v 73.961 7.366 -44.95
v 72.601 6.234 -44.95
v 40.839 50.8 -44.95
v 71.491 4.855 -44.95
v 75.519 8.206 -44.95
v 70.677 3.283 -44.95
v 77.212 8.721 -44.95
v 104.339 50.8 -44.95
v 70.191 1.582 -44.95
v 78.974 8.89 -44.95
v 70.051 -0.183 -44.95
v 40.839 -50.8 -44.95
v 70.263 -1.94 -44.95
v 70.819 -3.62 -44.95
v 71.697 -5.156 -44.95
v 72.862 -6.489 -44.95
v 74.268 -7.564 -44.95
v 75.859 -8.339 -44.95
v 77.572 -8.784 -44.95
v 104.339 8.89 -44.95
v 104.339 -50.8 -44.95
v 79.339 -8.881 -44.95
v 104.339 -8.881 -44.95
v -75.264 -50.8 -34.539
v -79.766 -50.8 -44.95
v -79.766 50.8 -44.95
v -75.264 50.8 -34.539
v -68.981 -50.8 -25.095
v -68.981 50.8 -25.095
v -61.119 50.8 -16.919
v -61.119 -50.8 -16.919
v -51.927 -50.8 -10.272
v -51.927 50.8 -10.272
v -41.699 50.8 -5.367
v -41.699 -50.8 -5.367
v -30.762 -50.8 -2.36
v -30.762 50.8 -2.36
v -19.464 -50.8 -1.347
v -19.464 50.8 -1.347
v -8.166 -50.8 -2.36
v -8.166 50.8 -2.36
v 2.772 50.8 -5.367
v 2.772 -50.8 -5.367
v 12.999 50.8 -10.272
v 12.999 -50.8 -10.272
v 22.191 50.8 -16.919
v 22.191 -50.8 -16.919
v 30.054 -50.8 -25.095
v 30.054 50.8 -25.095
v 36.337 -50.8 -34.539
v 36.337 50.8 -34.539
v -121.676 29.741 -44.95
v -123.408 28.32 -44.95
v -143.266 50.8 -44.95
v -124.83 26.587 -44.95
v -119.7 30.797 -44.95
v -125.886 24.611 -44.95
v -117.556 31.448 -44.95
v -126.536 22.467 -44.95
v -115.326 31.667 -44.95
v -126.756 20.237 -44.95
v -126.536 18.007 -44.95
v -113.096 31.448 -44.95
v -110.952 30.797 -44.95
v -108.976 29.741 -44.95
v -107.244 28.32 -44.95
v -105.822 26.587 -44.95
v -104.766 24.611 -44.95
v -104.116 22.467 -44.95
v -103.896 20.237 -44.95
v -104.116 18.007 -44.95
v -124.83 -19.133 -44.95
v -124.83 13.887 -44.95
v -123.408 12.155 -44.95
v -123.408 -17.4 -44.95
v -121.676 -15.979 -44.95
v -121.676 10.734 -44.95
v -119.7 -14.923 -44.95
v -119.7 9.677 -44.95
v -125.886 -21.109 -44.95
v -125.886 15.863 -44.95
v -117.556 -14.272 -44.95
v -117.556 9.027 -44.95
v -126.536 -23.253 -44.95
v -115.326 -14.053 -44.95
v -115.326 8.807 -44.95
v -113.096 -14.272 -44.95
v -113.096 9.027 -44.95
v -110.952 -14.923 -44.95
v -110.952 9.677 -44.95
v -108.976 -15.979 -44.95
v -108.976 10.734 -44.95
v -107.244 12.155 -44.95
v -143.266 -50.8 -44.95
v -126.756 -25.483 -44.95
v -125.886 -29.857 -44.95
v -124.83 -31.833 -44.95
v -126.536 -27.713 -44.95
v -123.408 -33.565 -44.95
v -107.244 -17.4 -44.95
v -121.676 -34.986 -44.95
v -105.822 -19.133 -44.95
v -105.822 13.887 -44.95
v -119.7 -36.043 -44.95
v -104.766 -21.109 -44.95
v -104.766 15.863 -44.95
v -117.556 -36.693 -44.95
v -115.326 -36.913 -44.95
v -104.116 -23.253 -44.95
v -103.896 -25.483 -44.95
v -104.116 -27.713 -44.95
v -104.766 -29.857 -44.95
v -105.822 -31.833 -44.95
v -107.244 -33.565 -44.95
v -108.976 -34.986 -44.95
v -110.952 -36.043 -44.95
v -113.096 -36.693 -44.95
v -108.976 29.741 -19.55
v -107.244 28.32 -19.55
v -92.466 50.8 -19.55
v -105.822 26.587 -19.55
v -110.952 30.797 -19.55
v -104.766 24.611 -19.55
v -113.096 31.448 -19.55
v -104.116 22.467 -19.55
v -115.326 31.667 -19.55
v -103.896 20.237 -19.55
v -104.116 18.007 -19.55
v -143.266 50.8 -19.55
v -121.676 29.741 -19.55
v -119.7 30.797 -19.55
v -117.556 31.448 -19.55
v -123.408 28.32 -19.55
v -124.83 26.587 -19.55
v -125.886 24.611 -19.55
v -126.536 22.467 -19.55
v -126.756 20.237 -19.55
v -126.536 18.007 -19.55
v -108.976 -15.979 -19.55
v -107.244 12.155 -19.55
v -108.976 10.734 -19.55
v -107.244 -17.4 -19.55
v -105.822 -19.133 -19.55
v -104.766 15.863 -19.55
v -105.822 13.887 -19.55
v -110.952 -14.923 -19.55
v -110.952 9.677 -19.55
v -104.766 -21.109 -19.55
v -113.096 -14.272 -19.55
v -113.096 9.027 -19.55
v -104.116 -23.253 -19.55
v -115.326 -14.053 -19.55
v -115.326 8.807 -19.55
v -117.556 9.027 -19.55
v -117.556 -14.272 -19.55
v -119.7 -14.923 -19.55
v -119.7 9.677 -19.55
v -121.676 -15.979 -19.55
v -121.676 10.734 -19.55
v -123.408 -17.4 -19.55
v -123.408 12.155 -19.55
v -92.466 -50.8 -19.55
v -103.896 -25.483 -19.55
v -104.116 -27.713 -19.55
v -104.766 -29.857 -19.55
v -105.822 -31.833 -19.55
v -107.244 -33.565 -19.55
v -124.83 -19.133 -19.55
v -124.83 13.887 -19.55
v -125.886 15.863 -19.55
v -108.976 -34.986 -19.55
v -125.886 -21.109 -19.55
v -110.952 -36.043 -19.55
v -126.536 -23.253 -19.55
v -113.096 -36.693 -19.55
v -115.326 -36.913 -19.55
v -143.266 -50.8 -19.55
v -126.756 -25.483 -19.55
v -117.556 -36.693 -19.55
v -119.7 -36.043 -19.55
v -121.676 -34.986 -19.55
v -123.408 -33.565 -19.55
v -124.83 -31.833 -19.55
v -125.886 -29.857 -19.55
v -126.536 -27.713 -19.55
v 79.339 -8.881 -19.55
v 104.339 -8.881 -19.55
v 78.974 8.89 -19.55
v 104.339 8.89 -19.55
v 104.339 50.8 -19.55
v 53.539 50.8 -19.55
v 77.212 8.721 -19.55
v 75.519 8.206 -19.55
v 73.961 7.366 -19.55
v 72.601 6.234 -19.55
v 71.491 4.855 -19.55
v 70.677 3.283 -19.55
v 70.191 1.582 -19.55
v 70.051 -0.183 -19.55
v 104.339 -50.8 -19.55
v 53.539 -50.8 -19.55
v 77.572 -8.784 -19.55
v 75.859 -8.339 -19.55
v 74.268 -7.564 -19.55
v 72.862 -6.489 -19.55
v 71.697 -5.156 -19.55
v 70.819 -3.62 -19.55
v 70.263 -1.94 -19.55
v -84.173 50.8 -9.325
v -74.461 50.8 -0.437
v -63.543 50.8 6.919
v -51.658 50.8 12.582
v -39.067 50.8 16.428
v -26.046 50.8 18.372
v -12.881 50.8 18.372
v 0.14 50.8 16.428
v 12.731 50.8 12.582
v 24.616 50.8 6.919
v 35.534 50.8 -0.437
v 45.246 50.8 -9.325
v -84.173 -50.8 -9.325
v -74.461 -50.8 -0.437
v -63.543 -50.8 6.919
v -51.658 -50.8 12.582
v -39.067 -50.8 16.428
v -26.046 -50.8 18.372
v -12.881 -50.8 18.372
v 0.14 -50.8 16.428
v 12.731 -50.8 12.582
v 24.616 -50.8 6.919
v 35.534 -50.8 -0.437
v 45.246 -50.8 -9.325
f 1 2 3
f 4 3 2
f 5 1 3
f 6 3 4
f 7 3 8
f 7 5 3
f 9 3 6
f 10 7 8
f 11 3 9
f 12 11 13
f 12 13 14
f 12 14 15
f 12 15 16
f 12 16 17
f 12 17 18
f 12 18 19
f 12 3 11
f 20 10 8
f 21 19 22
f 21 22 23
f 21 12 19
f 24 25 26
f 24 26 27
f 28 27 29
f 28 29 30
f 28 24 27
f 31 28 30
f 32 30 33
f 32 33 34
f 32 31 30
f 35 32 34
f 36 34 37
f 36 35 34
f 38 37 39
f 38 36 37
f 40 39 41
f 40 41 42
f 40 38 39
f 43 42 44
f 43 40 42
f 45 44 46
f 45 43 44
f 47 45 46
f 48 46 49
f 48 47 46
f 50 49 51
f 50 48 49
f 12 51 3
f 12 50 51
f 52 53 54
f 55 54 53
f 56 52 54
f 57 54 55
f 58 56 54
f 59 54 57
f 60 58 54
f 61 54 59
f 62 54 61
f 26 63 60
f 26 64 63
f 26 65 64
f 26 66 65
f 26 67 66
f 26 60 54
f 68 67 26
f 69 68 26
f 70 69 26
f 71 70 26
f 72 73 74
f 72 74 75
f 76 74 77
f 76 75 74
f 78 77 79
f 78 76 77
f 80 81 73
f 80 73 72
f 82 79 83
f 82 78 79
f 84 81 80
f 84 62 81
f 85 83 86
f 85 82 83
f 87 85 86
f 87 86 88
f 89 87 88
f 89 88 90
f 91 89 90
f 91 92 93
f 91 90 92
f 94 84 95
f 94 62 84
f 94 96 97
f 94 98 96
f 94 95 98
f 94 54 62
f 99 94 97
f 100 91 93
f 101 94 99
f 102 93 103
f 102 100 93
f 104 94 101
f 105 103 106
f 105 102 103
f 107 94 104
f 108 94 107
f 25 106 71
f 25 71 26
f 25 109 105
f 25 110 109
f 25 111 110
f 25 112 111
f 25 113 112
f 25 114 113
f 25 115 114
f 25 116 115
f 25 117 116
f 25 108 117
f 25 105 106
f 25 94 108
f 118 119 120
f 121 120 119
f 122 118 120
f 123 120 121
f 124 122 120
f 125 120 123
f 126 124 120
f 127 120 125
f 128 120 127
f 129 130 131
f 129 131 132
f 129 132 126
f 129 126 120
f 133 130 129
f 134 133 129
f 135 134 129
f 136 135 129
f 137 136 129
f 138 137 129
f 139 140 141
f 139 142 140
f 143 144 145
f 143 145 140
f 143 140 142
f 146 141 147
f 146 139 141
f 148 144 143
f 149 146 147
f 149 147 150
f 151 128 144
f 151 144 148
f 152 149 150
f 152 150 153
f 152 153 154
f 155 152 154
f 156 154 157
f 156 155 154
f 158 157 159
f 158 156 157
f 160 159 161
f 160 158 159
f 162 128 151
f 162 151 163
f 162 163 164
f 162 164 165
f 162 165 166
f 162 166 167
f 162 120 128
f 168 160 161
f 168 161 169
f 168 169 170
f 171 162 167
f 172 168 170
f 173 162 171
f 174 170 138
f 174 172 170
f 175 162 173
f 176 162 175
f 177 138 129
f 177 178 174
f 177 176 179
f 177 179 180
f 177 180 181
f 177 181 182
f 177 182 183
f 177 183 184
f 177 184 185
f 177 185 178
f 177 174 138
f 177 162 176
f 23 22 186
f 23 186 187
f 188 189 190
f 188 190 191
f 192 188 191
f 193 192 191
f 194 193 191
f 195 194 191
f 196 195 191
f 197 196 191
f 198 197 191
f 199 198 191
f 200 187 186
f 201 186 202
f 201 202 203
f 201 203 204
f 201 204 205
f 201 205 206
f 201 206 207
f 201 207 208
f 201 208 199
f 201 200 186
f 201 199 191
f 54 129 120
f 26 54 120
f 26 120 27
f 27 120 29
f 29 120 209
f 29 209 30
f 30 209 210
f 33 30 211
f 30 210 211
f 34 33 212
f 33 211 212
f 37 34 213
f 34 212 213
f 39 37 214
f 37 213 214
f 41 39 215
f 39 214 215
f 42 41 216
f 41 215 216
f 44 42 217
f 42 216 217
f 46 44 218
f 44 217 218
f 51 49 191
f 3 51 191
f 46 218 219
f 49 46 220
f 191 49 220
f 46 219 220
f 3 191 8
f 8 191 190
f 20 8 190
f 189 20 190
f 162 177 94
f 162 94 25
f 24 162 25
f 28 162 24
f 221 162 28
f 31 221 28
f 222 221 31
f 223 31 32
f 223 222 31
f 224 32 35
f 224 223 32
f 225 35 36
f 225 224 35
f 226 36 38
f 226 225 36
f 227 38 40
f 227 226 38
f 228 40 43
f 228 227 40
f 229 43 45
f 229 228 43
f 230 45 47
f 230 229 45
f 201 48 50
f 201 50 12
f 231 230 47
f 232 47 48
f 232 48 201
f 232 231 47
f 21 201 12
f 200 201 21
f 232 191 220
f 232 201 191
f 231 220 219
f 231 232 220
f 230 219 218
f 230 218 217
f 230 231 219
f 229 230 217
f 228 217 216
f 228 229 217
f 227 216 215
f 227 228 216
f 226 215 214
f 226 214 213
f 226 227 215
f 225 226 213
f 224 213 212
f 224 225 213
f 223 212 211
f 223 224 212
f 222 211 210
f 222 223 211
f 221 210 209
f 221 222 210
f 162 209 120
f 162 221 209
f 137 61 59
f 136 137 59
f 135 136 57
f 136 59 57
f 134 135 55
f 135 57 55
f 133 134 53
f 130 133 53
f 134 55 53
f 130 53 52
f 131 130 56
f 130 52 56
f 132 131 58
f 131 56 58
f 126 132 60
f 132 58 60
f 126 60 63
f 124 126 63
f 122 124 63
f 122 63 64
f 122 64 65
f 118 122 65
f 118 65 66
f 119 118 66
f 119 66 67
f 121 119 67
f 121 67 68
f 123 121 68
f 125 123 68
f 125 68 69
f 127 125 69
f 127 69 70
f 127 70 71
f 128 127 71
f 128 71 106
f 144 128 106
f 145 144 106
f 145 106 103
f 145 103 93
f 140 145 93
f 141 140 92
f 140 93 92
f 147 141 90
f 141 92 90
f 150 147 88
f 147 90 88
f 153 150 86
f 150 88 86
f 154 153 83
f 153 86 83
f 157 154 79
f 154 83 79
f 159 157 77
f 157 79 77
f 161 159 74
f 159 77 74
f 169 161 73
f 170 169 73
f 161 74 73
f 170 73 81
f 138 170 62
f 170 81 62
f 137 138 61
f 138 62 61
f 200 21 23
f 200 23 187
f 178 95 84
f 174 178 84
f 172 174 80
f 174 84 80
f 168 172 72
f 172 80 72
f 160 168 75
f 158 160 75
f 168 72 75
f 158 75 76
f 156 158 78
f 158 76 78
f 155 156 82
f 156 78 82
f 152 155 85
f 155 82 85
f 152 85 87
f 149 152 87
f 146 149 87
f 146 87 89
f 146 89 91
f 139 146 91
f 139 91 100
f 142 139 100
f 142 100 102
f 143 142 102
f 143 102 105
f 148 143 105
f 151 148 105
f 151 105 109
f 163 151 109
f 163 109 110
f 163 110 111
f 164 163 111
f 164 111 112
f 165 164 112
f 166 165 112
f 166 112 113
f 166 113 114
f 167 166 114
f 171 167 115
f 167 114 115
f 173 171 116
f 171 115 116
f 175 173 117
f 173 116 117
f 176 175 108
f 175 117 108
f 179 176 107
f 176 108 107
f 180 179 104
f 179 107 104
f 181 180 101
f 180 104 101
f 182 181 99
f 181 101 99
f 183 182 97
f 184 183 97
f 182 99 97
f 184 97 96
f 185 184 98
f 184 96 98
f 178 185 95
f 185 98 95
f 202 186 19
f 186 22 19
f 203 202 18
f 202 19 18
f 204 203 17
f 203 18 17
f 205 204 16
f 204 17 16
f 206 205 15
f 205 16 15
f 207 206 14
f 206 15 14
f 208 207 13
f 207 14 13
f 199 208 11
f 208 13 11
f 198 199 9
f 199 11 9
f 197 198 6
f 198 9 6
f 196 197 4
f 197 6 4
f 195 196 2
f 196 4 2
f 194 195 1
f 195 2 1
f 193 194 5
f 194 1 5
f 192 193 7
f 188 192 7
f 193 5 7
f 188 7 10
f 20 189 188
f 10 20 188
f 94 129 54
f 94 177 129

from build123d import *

# Parameters (mm, degrees)
F1_DEPTH = 50.8
F3_D     = 22.86
F5_D     = 17.78
F7_DEPTH = 25.4


with BuildPart() as f1:
    # F0 (on Front) → F1 (new body, symmetric)
    with BuildSketch(Plane.XZ):
        with BuildLine():
            Line((-143.2661156607, -19.5504479766), (-143.2661156607, -44.9504479766))
            Line((-143.2661156607, -44.9504479766), (-79.7661156607, -44.9504479766))
            ThreePointArc((-79.7661156607, -44.9504479766), (-19.4636605074, -1.3467768462), (40.8387946459, -44.9504479766))
            Line((40.8387946459, -44.9504479766), (104.3387946459, -44.9504479766))
            Line((104.3387946459, -44.9504479766), (104.3387946459, -19.5504479766))
            Line((104.3387946459, -19.5504479766), (53.5387946459, -19.5504479766))
            ThreePointArc((53.5387946459, -19.5504479766), (-19.4636605074, 18.6164115569), (-92.4661156607, -19.5504479766))
            Line((-92.4661156607, -19.5504479766), (-143.2661156607, -19.5504479766))
        make_face()
    extrude(amount=F1_DEPTH, both=True)

    # F3 (through all)
    with Locations(Plane.XY.offset(-19.5504479766)):
        with Locations((-115.3261156607, 20.2373286647), (-115.3261156607, -25.4826713353)):
            Hole(F3_D / 2)

    # F5 (through all)
    with Locations(Plane.XY):
        with Locations((78.9387946459, 0)):
            Hole(F5_D / 2)

    # F6 (on face) → F7 (cut)
    with BuildSketch(Plane.XY.offset(-19.5504479766)):
        with BuildLine():
            ThreePointArc((87.8287946459, 0), (85.3648331771, -6.1431367229), (79.338776919, -8.8809973641))
            Line((79.338776919, -8.8809973641), (104.3387946459, -8.8809973641))
            Line((104.3387946459, -8.8809973641), (104.3387946459, 8.8899307883))
            Line((104.3387946459, 8.8899307883), (78.9738742688, 8.8899307883))
            ThreePointArc((78.9738742688, 8.8899307883), (85.2373642393, 6.273764506), (87.8287946459, 0))
        make_face()
    extrude(amount=-F7_DEPTH, mode=Mode.SUBTRACT)


solid = f1.part
